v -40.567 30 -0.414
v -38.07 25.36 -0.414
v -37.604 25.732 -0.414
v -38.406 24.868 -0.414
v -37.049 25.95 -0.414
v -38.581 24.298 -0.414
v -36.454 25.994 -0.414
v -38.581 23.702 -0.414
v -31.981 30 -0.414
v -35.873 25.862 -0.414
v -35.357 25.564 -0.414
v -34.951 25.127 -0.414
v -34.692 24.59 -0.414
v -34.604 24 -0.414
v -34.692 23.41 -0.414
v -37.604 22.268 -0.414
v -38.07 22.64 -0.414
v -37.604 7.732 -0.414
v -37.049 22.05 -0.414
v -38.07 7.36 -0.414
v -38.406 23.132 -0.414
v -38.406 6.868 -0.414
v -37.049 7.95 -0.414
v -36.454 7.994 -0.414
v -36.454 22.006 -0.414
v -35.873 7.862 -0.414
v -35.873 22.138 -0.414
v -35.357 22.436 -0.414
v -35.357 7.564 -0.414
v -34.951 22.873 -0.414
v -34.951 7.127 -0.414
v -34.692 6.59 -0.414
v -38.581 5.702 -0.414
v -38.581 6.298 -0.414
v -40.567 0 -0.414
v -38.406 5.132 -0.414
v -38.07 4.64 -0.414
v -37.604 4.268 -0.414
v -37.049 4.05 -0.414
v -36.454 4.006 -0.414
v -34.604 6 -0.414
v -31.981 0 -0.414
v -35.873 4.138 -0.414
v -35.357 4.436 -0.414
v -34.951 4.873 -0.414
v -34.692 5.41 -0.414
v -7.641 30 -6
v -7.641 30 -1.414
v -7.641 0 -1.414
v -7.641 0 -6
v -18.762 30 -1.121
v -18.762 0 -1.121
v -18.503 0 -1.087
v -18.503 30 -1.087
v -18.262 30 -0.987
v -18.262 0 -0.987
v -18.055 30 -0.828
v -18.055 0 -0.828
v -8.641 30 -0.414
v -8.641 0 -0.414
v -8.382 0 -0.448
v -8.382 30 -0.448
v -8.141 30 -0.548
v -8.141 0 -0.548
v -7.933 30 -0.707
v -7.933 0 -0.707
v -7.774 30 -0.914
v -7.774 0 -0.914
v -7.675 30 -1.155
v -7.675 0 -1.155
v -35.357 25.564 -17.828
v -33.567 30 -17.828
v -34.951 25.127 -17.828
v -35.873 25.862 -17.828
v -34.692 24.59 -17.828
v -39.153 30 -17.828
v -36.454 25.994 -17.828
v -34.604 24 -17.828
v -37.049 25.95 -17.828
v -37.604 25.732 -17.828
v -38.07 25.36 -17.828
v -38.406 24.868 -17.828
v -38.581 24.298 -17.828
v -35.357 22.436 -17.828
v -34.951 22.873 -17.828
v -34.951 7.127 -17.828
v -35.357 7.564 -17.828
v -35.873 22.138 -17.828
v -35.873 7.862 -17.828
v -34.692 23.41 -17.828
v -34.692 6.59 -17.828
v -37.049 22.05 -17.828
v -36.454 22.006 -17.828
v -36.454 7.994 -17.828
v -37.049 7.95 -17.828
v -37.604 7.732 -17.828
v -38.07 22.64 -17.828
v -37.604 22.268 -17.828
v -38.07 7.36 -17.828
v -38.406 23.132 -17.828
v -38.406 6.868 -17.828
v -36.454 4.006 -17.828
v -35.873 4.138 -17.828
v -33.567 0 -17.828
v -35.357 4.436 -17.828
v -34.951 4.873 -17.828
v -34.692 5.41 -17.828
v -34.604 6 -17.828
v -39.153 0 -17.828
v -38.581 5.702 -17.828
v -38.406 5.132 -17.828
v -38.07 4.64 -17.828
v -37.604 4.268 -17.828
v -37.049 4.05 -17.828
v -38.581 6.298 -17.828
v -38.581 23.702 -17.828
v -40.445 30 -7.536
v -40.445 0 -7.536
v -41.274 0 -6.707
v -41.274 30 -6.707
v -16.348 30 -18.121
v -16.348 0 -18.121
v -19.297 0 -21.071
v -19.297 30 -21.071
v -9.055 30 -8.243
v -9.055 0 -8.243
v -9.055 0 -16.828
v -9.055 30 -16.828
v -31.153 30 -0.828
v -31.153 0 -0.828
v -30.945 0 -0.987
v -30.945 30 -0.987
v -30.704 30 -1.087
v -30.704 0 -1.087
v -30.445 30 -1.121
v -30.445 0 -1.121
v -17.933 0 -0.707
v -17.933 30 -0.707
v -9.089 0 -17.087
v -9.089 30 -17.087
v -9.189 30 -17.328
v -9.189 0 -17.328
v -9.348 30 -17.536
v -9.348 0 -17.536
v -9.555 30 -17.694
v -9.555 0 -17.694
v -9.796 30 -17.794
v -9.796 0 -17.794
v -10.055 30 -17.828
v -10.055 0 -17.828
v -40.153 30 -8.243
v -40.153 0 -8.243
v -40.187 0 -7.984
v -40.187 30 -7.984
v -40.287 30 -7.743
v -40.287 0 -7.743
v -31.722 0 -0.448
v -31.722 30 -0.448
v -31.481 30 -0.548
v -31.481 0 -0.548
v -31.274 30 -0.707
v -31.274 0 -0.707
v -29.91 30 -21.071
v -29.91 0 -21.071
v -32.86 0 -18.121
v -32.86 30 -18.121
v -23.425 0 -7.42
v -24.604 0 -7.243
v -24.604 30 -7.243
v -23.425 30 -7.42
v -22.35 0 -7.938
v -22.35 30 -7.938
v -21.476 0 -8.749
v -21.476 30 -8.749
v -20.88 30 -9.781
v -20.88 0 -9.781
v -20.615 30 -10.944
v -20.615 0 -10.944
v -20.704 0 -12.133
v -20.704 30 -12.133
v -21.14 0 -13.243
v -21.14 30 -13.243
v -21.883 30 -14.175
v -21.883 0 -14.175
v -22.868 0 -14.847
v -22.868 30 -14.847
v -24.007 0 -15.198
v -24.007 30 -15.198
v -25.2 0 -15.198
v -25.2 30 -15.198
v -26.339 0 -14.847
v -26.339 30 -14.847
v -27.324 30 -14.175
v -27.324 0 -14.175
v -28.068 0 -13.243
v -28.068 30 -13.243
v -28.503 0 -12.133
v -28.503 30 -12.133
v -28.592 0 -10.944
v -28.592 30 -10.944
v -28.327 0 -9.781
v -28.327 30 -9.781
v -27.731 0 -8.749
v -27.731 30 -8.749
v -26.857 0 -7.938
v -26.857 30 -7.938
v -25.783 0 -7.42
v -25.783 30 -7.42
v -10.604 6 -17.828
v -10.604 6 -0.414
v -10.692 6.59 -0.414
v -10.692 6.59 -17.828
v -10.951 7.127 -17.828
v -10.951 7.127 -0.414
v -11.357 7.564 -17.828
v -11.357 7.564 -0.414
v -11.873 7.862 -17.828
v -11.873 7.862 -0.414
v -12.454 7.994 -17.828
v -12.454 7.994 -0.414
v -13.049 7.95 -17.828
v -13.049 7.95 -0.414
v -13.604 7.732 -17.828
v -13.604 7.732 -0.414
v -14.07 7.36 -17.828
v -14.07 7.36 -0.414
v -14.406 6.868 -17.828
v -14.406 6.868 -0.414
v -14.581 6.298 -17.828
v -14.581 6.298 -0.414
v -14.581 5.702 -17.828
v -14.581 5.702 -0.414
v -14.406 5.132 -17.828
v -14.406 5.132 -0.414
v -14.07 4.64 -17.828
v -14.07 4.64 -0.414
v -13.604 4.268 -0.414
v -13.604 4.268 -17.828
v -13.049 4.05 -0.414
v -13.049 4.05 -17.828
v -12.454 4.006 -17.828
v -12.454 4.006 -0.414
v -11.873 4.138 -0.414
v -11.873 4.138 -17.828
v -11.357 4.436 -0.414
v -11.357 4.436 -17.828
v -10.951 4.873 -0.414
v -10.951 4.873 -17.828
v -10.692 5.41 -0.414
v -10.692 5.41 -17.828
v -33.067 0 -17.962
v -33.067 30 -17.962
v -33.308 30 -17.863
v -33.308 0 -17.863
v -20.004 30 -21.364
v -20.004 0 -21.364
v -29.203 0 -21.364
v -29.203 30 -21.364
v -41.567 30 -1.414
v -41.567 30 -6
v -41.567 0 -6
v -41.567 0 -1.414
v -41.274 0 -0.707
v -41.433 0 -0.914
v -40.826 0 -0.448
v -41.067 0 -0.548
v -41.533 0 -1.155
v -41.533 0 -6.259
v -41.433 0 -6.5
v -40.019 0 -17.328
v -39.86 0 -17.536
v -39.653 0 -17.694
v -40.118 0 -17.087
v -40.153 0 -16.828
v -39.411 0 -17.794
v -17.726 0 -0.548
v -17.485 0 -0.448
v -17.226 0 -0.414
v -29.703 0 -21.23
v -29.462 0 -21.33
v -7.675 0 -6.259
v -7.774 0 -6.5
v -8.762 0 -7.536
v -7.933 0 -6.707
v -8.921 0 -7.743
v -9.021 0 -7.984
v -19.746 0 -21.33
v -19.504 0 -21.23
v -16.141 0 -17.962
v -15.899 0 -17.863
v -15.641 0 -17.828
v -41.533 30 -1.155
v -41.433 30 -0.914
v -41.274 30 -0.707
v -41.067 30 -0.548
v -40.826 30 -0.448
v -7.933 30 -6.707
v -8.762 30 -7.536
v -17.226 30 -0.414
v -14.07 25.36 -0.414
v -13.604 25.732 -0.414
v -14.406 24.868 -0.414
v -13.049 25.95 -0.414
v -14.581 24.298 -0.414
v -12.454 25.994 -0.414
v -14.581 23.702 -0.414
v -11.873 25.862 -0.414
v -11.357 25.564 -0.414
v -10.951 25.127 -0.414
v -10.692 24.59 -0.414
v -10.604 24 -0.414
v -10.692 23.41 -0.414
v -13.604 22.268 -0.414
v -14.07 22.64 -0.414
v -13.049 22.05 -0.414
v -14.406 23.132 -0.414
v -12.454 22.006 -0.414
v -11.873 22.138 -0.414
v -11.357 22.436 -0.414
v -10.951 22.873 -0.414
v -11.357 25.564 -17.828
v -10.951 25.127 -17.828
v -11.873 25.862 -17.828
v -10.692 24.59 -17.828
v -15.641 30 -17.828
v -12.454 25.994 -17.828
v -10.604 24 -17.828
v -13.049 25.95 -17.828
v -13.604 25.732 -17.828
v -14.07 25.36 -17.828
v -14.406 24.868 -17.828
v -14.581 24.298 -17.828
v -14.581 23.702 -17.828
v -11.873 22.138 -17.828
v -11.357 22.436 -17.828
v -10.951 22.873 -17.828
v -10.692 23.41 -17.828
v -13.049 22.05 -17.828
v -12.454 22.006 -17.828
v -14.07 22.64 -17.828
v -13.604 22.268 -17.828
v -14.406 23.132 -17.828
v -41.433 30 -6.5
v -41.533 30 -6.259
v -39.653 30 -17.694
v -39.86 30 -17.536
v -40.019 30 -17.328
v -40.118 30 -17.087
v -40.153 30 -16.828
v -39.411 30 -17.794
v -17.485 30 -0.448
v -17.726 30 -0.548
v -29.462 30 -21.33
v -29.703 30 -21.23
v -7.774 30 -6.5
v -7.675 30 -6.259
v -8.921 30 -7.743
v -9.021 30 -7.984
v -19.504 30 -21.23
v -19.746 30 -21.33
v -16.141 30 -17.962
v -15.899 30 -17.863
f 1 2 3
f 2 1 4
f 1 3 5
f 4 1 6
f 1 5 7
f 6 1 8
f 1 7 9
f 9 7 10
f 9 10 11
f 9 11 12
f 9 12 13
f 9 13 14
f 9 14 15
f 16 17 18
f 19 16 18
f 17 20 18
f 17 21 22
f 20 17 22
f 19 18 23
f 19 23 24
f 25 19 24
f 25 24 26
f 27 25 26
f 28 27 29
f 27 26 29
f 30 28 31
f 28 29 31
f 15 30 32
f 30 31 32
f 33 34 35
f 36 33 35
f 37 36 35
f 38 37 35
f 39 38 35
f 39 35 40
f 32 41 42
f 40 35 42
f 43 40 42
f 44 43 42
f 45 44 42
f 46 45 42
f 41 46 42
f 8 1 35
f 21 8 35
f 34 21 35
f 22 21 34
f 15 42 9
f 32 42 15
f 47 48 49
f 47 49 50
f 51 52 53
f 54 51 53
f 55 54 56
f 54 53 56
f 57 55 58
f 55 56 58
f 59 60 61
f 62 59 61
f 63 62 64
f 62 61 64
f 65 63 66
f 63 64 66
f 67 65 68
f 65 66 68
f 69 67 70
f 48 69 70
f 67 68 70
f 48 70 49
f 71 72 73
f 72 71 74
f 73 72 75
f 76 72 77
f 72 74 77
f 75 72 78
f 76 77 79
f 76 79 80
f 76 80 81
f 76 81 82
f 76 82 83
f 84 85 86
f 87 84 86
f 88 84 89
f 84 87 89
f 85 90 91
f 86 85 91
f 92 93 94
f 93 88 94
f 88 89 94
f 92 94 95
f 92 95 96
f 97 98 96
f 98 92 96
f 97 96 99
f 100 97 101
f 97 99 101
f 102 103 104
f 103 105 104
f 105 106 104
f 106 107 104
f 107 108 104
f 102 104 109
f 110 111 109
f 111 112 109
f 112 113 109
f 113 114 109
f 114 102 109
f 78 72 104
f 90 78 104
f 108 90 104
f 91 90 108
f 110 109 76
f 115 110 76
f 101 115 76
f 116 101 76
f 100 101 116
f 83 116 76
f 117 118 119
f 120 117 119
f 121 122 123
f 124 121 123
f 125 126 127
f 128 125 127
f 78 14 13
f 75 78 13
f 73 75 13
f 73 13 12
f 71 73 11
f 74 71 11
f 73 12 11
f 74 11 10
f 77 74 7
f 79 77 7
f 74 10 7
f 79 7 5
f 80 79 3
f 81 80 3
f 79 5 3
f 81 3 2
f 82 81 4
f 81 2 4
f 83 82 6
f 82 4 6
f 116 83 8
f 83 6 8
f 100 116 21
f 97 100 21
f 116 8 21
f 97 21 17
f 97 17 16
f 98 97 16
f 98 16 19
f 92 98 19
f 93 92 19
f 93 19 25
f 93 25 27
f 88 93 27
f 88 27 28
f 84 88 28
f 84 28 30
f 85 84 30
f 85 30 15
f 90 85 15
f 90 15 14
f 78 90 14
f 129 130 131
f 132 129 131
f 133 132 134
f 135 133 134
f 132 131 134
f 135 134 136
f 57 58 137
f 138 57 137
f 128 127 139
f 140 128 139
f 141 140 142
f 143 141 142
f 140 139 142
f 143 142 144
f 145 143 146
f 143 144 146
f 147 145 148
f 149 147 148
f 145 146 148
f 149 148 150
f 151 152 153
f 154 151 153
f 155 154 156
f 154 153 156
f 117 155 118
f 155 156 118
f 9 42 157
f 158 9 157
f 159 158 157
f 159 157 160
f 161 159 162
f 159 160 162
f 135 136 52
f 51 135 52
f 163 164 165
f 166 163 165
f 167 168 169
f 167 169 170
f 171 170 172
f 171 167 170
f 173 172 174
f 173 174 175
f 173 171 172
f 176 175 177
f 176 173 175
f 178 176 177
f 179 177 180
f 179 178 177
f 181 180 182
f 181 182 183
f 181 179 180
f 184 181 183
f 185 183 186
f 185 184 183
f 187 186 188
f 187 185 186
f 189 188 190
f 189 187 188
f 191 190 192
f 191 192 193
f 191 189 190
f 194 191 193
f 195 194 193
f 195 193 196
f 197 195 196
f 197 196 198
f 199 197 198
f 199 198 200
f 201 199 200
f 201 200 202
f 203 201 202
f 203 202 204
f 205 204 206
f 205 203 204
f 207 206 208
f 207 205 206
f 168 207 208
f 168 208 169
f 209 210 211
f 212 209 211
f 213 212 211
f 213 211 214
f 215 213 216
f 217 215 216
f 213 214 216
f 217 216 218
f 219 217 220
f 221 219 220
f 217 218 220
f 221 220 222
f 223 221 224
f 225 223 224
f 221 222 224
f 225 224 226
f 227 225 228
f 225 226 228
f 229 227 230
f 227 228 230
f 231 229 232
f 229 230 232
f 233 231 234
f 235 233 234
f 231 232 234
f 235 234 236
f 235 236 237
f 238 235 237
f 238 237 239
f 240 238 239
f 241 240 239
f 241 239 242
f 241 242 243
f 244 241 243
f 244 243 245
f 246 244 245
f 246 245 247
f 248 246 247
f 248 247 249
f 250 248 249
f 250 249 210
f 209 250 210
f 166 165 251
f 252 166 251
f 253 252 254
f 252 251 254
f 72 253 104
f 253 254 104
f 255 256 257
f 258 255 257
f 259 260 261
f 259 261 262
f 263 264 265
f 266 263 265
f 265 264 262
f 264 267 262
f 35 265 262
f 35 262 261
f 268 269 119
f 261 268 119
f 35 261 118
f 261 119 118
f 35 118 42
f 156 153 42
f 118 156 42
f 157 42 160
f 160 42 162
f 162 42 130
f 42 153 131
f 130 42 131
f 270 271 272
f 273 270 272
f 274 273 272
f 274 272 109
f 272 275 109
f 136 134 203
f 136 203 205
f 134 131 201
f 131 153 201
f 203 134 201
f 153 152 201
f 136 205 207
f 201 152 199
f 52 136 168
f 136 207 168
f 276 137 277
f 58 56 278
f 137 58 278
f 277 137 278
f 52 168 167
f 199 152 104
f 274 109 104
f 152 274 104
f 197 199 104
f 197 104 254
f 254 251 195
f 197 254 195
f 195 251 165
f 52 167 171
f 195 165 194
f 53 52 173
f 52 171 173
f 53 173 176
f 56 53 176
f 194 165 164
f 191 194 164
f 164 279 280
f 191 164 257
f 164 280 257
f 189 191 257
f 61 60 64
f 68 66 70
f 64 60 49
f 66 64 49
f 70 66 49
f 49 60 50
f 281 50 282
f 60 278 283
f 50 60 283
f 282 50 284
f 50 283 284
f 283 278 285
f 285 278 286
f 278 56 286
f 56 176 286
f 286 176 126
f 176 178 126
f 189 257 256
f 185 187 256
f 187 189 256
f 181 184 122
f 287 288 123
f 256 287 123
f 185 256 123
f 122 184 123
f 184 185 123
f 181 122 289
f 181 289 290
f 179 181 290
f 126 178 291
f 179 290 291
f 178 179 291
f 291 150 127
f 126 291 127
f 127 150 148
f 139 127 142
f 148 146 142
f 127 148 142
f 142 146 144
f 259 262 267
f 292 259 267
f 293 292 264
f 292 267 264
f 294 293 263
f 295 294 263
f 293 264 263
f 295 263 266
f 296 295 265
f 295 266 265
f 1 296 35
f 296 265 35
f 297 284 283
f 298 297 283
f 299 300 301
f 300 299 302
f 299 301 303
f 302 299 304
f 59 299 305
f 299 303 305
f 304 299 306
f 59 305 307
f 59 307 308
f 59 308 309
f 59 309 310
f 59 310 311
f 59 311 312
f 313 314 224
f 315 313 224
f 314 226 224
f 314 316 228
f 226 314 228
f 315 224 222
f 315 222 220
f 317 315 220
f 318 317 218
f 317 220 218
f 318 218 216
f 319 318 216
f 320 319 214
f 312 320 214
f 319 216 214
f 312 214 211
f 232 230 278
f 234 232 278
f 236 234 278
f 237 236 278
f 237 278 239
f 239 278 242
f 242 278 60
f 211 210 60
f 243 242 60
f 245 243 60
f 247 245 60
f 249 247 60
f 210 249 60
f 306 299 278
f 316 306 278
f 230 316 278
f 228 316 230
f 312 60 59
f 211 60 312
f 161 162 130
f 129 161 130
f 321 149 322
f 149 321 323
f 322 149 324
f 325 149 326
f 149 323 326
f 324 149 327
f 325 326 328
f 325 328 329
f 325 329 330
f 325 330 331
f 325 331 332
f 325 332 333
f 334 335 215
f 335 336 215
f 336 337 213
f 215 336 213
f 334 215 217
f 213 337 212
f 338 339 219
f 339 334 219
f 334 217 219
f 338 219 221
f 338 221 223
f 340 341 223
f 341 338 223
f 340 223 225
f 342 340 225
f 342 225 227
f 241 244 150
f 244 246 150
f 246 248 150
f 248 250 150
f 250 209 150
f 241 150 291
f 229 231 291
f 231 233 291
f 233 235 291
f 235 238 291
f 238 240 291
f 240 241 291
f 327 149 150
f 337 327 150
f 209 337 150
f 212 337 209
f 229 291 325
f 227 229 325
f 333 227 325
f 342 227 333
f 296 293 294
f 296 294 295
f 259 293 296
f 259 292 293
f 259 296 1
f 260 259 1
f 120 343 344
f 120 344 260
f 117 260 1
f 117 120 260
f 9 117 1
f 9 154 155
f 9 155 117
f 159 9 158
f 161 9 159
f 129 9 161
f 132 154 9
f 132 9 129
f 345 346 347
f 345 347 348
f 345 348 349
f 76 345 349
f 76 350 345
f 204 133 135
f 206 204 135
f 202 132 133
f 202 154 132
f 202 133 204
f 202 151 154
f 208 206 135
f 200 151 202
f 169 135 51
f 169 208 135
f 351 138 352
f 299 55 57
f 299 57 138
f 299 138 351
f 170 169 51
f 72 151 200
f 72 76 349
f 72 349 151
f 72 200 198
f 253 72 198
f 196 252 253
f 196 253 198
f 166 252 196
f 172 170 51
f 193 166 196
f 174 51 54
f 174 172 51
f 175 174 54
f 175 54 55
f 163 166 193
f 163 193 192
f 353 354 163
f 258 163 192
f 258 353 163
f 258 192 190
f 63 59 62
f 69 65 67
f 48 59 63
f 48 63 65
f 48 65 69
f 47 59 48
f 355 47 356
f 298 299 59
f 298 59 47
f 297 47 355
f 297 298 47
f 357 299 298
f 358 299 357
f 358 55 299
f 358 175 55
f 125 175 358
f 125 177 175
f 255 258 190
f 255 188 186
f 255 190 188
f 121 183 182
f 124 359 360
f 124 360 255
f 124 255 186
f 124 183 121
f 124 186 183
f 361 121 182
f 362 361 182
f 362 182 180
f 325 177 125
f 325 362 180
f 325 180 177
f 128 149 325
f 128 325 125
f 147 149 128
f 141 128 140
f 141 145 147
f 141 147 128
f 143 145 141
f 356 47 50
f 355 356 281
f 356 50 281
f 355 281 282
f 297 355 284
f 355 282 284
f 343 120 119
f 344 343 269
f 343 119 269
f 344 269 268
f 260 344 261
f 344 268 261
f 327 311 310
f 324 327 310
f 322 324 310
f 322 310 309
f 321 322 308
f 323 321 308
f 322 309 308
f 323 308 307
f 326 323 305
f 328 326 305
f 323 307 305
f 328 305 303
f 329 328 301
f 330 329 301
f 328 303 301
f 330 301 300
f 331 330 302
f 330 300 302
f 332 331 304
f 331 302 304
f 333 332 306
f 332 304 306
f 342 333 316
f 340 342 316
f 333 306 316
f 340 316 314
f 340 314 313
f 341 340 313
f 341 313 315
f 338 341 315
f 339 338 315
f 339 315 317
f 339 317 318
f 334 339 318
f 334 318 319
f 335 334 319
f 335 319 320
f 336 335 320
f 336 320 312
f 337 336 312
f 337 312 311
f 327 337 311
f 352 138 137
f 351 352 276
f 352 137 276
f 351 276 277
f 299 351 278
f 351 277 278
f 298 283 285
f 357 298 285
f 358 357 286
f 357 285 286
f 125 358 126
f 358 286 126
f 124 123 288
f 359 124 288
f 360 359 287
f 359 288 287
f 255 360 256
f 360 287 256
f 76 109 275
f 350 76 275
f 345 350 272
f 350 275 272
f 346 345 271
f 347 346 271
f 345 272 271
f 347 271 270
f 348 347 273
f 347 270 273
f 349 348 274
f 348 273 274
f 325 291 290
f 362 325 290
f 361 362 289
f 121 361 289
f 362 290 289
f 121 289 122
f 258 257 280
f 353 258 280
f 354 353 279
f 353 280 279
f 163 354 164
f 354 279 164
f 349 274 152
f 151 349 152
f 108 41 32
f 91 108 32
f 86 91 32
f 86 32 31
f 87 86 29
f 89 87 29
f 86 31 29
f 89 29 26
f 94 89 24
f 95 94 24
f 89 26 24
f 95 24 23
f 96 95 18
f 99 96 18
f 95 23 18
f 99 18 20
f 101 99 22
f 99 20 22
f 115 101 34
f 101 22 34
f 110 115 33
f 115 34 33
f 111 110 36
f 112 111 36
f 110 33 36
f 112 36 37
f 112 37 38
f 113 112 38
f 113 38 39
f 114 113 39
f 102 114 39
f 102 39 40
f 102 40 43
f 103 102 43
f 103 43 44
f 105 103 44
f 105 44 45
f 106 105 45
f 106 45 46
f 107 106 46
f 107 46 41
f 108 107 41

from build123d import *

# Parameters (mm, degrees)
SKETCH_1_R          = 4
EXTRUDE_1_DEPTH     = 30
SKETCH_3_R          = 2
CUT_EXTRUDE_1_DEPTH = 100


with BuildPart() as part:
    # 草图1 → 凸台-拉伸1 (new body)
    with BuildSketch(Plane(origin=(0, 0, 0), x_dir=(1, 0, 0), z_dir=(0, 1, 0))):
        with BuildLine():
            Line((-40.566755923, 0.414213562), (-31.980969486, 0.414213562))
            ThreePointArc((-31.980969486, 0.414213562), (-31.598286053, 0.49033403), (-31.273862704, 0.707106781))
            Line((-31.273862704, 0.707106781), (-31.152542361, 0.828427125))
            ThreePointArc((-31.152542361, 0.828427125), (-30.828119012, 1.045199876), (-30.44543558, 1.121320344))
            Line((-30.44543558, 1.121320344), (-18.761824504, 1.121320344))
            ThreePointArc((-18.761824504, 1.121320344), (-18.379141072, 1.045199876), (-18.054717723, 0.828427125))
            Line((-18.054717723, 0.828427125), (-17.933397379, 0.707106781))
            ThreePointArc((-17.933397379, 0.707106781), (-17.60897403, 0.49033403), (-17.226290598, 0.414213562))
            Line((-17.226290598, 0.414213562), (-8.64050416, 0.414213562))
            ThreePointArc((-8.64050416, 0.414213562), (-7.933397379, 0.707106781), (-7.64050416, 1.414213562))
            Line((-7.64050416, 1.414213562), (-7.64050416, 6))
            ThreePointArc((-7.64050416, 6), (-7.716624628, 6.382683432), (-7.933397379, 6.707106781))
            Line((-7.933397379, 6.707106781), (-8.761824504, 7.535533906))
            ThreePointArc((-8.761824504, 7.535533906), (-8.978597255, 7.859957255), (-9.054717723, 8.242640687))
            Line((-9.054717723, 8.242640687), (-9.054717723, 16.828427125))
            ThreePointArc((-9.054717723, 16.828427125), (-9.347610942, 17.535533906), (-10.054717723, 17.828427125))
            Line((-10.054717723, 17.828427125), (-15.64050416, 17.828427125))
            ThreePointArc((-15.64050416, 17.828427125), (-16.023187593, 17.904547592), (-16.347610942, 18.121320344))
            Line((-16.347610942, 18.121320344), (-19.29735841, 21.071067812))
            ThreePointArc((-19.29735841, 21.071067812), (-19.621781759, 21.287840563), (-20.004465191, 21.363961031))
            Line((-20.004465191, 21.363961031), (-29.202794893, 21.363961031))
            ThreePointArc((-29.202794893, 21.363961031), (-29.585478325, 21.287840563), (-29.909901674, 21.071067812))
            Line((-29.909901674, 21.071067812), (-32.859649142, 18.121320344))
            ThreePointArc((-32.859649142, 18.121320344), (-33.184072491, 17.904547592), (-33.566755923, 17.828427125))
            Line((-33.566755923, 17.828427125), (-39.152542361, 17.828427125))
            ThreePointArc((-39.152542361, 17.828427125), (-39.859649142, 17.535533906), (-40.152542361, 16.828427125))
            Line((-40.152542361, 16.828427125), (-40.152542361, 8.242640687))
            ThreePointArc((-40.152542361, 8.242640687), (-40.228662828, 7.859957255), (-40.44543558, 7.535533906))
            Line((-40.44543558, 7.535533906), (-41.273862704, 6.707106781))
            ThreePointArc((-41.273862704, 6.707106781), (-41.490635456, 6.382683432), (-41.566755923, 6))
            Line((-41.566755923, 6), (-41.566755923, 1.414213562))
            ThreePointArc((-41.566755923, 1.414213562), (-41.273862704, 0.707106781), (-40.566755923, 0.414213562))
        make_face()
        with Locations(Location((-24.603630042, 11.242640687, 0), (0, 0, 270))):
            Circle(SKETCH_1_R, mode=Mode.SUBTRACT)
    extrude(amount=EXTRUDE_1_DEPTH)

    # 草图3 → 切除-拉伸1 (cut)
    with BuildSketch(Plane.XY.offset(-0.414213562)):
        with Locations((-12.603630042, 6)):
            Circle(SKETCH_3_R)
        with Locations((-36.603630042, 6)):
            Circle(SKETCH_3_R)
        with Locations((-36.603630042, 24)):
            Circle(SKETCH_3_R)
        with Locations((-12.603630042, 24)):
            Circle(SKETCH_3_R)
    extrude(amount=-CUT_EXTRUDE_1_DEPTH, mode=Mode.SUBTRACT)


solid = part.part
